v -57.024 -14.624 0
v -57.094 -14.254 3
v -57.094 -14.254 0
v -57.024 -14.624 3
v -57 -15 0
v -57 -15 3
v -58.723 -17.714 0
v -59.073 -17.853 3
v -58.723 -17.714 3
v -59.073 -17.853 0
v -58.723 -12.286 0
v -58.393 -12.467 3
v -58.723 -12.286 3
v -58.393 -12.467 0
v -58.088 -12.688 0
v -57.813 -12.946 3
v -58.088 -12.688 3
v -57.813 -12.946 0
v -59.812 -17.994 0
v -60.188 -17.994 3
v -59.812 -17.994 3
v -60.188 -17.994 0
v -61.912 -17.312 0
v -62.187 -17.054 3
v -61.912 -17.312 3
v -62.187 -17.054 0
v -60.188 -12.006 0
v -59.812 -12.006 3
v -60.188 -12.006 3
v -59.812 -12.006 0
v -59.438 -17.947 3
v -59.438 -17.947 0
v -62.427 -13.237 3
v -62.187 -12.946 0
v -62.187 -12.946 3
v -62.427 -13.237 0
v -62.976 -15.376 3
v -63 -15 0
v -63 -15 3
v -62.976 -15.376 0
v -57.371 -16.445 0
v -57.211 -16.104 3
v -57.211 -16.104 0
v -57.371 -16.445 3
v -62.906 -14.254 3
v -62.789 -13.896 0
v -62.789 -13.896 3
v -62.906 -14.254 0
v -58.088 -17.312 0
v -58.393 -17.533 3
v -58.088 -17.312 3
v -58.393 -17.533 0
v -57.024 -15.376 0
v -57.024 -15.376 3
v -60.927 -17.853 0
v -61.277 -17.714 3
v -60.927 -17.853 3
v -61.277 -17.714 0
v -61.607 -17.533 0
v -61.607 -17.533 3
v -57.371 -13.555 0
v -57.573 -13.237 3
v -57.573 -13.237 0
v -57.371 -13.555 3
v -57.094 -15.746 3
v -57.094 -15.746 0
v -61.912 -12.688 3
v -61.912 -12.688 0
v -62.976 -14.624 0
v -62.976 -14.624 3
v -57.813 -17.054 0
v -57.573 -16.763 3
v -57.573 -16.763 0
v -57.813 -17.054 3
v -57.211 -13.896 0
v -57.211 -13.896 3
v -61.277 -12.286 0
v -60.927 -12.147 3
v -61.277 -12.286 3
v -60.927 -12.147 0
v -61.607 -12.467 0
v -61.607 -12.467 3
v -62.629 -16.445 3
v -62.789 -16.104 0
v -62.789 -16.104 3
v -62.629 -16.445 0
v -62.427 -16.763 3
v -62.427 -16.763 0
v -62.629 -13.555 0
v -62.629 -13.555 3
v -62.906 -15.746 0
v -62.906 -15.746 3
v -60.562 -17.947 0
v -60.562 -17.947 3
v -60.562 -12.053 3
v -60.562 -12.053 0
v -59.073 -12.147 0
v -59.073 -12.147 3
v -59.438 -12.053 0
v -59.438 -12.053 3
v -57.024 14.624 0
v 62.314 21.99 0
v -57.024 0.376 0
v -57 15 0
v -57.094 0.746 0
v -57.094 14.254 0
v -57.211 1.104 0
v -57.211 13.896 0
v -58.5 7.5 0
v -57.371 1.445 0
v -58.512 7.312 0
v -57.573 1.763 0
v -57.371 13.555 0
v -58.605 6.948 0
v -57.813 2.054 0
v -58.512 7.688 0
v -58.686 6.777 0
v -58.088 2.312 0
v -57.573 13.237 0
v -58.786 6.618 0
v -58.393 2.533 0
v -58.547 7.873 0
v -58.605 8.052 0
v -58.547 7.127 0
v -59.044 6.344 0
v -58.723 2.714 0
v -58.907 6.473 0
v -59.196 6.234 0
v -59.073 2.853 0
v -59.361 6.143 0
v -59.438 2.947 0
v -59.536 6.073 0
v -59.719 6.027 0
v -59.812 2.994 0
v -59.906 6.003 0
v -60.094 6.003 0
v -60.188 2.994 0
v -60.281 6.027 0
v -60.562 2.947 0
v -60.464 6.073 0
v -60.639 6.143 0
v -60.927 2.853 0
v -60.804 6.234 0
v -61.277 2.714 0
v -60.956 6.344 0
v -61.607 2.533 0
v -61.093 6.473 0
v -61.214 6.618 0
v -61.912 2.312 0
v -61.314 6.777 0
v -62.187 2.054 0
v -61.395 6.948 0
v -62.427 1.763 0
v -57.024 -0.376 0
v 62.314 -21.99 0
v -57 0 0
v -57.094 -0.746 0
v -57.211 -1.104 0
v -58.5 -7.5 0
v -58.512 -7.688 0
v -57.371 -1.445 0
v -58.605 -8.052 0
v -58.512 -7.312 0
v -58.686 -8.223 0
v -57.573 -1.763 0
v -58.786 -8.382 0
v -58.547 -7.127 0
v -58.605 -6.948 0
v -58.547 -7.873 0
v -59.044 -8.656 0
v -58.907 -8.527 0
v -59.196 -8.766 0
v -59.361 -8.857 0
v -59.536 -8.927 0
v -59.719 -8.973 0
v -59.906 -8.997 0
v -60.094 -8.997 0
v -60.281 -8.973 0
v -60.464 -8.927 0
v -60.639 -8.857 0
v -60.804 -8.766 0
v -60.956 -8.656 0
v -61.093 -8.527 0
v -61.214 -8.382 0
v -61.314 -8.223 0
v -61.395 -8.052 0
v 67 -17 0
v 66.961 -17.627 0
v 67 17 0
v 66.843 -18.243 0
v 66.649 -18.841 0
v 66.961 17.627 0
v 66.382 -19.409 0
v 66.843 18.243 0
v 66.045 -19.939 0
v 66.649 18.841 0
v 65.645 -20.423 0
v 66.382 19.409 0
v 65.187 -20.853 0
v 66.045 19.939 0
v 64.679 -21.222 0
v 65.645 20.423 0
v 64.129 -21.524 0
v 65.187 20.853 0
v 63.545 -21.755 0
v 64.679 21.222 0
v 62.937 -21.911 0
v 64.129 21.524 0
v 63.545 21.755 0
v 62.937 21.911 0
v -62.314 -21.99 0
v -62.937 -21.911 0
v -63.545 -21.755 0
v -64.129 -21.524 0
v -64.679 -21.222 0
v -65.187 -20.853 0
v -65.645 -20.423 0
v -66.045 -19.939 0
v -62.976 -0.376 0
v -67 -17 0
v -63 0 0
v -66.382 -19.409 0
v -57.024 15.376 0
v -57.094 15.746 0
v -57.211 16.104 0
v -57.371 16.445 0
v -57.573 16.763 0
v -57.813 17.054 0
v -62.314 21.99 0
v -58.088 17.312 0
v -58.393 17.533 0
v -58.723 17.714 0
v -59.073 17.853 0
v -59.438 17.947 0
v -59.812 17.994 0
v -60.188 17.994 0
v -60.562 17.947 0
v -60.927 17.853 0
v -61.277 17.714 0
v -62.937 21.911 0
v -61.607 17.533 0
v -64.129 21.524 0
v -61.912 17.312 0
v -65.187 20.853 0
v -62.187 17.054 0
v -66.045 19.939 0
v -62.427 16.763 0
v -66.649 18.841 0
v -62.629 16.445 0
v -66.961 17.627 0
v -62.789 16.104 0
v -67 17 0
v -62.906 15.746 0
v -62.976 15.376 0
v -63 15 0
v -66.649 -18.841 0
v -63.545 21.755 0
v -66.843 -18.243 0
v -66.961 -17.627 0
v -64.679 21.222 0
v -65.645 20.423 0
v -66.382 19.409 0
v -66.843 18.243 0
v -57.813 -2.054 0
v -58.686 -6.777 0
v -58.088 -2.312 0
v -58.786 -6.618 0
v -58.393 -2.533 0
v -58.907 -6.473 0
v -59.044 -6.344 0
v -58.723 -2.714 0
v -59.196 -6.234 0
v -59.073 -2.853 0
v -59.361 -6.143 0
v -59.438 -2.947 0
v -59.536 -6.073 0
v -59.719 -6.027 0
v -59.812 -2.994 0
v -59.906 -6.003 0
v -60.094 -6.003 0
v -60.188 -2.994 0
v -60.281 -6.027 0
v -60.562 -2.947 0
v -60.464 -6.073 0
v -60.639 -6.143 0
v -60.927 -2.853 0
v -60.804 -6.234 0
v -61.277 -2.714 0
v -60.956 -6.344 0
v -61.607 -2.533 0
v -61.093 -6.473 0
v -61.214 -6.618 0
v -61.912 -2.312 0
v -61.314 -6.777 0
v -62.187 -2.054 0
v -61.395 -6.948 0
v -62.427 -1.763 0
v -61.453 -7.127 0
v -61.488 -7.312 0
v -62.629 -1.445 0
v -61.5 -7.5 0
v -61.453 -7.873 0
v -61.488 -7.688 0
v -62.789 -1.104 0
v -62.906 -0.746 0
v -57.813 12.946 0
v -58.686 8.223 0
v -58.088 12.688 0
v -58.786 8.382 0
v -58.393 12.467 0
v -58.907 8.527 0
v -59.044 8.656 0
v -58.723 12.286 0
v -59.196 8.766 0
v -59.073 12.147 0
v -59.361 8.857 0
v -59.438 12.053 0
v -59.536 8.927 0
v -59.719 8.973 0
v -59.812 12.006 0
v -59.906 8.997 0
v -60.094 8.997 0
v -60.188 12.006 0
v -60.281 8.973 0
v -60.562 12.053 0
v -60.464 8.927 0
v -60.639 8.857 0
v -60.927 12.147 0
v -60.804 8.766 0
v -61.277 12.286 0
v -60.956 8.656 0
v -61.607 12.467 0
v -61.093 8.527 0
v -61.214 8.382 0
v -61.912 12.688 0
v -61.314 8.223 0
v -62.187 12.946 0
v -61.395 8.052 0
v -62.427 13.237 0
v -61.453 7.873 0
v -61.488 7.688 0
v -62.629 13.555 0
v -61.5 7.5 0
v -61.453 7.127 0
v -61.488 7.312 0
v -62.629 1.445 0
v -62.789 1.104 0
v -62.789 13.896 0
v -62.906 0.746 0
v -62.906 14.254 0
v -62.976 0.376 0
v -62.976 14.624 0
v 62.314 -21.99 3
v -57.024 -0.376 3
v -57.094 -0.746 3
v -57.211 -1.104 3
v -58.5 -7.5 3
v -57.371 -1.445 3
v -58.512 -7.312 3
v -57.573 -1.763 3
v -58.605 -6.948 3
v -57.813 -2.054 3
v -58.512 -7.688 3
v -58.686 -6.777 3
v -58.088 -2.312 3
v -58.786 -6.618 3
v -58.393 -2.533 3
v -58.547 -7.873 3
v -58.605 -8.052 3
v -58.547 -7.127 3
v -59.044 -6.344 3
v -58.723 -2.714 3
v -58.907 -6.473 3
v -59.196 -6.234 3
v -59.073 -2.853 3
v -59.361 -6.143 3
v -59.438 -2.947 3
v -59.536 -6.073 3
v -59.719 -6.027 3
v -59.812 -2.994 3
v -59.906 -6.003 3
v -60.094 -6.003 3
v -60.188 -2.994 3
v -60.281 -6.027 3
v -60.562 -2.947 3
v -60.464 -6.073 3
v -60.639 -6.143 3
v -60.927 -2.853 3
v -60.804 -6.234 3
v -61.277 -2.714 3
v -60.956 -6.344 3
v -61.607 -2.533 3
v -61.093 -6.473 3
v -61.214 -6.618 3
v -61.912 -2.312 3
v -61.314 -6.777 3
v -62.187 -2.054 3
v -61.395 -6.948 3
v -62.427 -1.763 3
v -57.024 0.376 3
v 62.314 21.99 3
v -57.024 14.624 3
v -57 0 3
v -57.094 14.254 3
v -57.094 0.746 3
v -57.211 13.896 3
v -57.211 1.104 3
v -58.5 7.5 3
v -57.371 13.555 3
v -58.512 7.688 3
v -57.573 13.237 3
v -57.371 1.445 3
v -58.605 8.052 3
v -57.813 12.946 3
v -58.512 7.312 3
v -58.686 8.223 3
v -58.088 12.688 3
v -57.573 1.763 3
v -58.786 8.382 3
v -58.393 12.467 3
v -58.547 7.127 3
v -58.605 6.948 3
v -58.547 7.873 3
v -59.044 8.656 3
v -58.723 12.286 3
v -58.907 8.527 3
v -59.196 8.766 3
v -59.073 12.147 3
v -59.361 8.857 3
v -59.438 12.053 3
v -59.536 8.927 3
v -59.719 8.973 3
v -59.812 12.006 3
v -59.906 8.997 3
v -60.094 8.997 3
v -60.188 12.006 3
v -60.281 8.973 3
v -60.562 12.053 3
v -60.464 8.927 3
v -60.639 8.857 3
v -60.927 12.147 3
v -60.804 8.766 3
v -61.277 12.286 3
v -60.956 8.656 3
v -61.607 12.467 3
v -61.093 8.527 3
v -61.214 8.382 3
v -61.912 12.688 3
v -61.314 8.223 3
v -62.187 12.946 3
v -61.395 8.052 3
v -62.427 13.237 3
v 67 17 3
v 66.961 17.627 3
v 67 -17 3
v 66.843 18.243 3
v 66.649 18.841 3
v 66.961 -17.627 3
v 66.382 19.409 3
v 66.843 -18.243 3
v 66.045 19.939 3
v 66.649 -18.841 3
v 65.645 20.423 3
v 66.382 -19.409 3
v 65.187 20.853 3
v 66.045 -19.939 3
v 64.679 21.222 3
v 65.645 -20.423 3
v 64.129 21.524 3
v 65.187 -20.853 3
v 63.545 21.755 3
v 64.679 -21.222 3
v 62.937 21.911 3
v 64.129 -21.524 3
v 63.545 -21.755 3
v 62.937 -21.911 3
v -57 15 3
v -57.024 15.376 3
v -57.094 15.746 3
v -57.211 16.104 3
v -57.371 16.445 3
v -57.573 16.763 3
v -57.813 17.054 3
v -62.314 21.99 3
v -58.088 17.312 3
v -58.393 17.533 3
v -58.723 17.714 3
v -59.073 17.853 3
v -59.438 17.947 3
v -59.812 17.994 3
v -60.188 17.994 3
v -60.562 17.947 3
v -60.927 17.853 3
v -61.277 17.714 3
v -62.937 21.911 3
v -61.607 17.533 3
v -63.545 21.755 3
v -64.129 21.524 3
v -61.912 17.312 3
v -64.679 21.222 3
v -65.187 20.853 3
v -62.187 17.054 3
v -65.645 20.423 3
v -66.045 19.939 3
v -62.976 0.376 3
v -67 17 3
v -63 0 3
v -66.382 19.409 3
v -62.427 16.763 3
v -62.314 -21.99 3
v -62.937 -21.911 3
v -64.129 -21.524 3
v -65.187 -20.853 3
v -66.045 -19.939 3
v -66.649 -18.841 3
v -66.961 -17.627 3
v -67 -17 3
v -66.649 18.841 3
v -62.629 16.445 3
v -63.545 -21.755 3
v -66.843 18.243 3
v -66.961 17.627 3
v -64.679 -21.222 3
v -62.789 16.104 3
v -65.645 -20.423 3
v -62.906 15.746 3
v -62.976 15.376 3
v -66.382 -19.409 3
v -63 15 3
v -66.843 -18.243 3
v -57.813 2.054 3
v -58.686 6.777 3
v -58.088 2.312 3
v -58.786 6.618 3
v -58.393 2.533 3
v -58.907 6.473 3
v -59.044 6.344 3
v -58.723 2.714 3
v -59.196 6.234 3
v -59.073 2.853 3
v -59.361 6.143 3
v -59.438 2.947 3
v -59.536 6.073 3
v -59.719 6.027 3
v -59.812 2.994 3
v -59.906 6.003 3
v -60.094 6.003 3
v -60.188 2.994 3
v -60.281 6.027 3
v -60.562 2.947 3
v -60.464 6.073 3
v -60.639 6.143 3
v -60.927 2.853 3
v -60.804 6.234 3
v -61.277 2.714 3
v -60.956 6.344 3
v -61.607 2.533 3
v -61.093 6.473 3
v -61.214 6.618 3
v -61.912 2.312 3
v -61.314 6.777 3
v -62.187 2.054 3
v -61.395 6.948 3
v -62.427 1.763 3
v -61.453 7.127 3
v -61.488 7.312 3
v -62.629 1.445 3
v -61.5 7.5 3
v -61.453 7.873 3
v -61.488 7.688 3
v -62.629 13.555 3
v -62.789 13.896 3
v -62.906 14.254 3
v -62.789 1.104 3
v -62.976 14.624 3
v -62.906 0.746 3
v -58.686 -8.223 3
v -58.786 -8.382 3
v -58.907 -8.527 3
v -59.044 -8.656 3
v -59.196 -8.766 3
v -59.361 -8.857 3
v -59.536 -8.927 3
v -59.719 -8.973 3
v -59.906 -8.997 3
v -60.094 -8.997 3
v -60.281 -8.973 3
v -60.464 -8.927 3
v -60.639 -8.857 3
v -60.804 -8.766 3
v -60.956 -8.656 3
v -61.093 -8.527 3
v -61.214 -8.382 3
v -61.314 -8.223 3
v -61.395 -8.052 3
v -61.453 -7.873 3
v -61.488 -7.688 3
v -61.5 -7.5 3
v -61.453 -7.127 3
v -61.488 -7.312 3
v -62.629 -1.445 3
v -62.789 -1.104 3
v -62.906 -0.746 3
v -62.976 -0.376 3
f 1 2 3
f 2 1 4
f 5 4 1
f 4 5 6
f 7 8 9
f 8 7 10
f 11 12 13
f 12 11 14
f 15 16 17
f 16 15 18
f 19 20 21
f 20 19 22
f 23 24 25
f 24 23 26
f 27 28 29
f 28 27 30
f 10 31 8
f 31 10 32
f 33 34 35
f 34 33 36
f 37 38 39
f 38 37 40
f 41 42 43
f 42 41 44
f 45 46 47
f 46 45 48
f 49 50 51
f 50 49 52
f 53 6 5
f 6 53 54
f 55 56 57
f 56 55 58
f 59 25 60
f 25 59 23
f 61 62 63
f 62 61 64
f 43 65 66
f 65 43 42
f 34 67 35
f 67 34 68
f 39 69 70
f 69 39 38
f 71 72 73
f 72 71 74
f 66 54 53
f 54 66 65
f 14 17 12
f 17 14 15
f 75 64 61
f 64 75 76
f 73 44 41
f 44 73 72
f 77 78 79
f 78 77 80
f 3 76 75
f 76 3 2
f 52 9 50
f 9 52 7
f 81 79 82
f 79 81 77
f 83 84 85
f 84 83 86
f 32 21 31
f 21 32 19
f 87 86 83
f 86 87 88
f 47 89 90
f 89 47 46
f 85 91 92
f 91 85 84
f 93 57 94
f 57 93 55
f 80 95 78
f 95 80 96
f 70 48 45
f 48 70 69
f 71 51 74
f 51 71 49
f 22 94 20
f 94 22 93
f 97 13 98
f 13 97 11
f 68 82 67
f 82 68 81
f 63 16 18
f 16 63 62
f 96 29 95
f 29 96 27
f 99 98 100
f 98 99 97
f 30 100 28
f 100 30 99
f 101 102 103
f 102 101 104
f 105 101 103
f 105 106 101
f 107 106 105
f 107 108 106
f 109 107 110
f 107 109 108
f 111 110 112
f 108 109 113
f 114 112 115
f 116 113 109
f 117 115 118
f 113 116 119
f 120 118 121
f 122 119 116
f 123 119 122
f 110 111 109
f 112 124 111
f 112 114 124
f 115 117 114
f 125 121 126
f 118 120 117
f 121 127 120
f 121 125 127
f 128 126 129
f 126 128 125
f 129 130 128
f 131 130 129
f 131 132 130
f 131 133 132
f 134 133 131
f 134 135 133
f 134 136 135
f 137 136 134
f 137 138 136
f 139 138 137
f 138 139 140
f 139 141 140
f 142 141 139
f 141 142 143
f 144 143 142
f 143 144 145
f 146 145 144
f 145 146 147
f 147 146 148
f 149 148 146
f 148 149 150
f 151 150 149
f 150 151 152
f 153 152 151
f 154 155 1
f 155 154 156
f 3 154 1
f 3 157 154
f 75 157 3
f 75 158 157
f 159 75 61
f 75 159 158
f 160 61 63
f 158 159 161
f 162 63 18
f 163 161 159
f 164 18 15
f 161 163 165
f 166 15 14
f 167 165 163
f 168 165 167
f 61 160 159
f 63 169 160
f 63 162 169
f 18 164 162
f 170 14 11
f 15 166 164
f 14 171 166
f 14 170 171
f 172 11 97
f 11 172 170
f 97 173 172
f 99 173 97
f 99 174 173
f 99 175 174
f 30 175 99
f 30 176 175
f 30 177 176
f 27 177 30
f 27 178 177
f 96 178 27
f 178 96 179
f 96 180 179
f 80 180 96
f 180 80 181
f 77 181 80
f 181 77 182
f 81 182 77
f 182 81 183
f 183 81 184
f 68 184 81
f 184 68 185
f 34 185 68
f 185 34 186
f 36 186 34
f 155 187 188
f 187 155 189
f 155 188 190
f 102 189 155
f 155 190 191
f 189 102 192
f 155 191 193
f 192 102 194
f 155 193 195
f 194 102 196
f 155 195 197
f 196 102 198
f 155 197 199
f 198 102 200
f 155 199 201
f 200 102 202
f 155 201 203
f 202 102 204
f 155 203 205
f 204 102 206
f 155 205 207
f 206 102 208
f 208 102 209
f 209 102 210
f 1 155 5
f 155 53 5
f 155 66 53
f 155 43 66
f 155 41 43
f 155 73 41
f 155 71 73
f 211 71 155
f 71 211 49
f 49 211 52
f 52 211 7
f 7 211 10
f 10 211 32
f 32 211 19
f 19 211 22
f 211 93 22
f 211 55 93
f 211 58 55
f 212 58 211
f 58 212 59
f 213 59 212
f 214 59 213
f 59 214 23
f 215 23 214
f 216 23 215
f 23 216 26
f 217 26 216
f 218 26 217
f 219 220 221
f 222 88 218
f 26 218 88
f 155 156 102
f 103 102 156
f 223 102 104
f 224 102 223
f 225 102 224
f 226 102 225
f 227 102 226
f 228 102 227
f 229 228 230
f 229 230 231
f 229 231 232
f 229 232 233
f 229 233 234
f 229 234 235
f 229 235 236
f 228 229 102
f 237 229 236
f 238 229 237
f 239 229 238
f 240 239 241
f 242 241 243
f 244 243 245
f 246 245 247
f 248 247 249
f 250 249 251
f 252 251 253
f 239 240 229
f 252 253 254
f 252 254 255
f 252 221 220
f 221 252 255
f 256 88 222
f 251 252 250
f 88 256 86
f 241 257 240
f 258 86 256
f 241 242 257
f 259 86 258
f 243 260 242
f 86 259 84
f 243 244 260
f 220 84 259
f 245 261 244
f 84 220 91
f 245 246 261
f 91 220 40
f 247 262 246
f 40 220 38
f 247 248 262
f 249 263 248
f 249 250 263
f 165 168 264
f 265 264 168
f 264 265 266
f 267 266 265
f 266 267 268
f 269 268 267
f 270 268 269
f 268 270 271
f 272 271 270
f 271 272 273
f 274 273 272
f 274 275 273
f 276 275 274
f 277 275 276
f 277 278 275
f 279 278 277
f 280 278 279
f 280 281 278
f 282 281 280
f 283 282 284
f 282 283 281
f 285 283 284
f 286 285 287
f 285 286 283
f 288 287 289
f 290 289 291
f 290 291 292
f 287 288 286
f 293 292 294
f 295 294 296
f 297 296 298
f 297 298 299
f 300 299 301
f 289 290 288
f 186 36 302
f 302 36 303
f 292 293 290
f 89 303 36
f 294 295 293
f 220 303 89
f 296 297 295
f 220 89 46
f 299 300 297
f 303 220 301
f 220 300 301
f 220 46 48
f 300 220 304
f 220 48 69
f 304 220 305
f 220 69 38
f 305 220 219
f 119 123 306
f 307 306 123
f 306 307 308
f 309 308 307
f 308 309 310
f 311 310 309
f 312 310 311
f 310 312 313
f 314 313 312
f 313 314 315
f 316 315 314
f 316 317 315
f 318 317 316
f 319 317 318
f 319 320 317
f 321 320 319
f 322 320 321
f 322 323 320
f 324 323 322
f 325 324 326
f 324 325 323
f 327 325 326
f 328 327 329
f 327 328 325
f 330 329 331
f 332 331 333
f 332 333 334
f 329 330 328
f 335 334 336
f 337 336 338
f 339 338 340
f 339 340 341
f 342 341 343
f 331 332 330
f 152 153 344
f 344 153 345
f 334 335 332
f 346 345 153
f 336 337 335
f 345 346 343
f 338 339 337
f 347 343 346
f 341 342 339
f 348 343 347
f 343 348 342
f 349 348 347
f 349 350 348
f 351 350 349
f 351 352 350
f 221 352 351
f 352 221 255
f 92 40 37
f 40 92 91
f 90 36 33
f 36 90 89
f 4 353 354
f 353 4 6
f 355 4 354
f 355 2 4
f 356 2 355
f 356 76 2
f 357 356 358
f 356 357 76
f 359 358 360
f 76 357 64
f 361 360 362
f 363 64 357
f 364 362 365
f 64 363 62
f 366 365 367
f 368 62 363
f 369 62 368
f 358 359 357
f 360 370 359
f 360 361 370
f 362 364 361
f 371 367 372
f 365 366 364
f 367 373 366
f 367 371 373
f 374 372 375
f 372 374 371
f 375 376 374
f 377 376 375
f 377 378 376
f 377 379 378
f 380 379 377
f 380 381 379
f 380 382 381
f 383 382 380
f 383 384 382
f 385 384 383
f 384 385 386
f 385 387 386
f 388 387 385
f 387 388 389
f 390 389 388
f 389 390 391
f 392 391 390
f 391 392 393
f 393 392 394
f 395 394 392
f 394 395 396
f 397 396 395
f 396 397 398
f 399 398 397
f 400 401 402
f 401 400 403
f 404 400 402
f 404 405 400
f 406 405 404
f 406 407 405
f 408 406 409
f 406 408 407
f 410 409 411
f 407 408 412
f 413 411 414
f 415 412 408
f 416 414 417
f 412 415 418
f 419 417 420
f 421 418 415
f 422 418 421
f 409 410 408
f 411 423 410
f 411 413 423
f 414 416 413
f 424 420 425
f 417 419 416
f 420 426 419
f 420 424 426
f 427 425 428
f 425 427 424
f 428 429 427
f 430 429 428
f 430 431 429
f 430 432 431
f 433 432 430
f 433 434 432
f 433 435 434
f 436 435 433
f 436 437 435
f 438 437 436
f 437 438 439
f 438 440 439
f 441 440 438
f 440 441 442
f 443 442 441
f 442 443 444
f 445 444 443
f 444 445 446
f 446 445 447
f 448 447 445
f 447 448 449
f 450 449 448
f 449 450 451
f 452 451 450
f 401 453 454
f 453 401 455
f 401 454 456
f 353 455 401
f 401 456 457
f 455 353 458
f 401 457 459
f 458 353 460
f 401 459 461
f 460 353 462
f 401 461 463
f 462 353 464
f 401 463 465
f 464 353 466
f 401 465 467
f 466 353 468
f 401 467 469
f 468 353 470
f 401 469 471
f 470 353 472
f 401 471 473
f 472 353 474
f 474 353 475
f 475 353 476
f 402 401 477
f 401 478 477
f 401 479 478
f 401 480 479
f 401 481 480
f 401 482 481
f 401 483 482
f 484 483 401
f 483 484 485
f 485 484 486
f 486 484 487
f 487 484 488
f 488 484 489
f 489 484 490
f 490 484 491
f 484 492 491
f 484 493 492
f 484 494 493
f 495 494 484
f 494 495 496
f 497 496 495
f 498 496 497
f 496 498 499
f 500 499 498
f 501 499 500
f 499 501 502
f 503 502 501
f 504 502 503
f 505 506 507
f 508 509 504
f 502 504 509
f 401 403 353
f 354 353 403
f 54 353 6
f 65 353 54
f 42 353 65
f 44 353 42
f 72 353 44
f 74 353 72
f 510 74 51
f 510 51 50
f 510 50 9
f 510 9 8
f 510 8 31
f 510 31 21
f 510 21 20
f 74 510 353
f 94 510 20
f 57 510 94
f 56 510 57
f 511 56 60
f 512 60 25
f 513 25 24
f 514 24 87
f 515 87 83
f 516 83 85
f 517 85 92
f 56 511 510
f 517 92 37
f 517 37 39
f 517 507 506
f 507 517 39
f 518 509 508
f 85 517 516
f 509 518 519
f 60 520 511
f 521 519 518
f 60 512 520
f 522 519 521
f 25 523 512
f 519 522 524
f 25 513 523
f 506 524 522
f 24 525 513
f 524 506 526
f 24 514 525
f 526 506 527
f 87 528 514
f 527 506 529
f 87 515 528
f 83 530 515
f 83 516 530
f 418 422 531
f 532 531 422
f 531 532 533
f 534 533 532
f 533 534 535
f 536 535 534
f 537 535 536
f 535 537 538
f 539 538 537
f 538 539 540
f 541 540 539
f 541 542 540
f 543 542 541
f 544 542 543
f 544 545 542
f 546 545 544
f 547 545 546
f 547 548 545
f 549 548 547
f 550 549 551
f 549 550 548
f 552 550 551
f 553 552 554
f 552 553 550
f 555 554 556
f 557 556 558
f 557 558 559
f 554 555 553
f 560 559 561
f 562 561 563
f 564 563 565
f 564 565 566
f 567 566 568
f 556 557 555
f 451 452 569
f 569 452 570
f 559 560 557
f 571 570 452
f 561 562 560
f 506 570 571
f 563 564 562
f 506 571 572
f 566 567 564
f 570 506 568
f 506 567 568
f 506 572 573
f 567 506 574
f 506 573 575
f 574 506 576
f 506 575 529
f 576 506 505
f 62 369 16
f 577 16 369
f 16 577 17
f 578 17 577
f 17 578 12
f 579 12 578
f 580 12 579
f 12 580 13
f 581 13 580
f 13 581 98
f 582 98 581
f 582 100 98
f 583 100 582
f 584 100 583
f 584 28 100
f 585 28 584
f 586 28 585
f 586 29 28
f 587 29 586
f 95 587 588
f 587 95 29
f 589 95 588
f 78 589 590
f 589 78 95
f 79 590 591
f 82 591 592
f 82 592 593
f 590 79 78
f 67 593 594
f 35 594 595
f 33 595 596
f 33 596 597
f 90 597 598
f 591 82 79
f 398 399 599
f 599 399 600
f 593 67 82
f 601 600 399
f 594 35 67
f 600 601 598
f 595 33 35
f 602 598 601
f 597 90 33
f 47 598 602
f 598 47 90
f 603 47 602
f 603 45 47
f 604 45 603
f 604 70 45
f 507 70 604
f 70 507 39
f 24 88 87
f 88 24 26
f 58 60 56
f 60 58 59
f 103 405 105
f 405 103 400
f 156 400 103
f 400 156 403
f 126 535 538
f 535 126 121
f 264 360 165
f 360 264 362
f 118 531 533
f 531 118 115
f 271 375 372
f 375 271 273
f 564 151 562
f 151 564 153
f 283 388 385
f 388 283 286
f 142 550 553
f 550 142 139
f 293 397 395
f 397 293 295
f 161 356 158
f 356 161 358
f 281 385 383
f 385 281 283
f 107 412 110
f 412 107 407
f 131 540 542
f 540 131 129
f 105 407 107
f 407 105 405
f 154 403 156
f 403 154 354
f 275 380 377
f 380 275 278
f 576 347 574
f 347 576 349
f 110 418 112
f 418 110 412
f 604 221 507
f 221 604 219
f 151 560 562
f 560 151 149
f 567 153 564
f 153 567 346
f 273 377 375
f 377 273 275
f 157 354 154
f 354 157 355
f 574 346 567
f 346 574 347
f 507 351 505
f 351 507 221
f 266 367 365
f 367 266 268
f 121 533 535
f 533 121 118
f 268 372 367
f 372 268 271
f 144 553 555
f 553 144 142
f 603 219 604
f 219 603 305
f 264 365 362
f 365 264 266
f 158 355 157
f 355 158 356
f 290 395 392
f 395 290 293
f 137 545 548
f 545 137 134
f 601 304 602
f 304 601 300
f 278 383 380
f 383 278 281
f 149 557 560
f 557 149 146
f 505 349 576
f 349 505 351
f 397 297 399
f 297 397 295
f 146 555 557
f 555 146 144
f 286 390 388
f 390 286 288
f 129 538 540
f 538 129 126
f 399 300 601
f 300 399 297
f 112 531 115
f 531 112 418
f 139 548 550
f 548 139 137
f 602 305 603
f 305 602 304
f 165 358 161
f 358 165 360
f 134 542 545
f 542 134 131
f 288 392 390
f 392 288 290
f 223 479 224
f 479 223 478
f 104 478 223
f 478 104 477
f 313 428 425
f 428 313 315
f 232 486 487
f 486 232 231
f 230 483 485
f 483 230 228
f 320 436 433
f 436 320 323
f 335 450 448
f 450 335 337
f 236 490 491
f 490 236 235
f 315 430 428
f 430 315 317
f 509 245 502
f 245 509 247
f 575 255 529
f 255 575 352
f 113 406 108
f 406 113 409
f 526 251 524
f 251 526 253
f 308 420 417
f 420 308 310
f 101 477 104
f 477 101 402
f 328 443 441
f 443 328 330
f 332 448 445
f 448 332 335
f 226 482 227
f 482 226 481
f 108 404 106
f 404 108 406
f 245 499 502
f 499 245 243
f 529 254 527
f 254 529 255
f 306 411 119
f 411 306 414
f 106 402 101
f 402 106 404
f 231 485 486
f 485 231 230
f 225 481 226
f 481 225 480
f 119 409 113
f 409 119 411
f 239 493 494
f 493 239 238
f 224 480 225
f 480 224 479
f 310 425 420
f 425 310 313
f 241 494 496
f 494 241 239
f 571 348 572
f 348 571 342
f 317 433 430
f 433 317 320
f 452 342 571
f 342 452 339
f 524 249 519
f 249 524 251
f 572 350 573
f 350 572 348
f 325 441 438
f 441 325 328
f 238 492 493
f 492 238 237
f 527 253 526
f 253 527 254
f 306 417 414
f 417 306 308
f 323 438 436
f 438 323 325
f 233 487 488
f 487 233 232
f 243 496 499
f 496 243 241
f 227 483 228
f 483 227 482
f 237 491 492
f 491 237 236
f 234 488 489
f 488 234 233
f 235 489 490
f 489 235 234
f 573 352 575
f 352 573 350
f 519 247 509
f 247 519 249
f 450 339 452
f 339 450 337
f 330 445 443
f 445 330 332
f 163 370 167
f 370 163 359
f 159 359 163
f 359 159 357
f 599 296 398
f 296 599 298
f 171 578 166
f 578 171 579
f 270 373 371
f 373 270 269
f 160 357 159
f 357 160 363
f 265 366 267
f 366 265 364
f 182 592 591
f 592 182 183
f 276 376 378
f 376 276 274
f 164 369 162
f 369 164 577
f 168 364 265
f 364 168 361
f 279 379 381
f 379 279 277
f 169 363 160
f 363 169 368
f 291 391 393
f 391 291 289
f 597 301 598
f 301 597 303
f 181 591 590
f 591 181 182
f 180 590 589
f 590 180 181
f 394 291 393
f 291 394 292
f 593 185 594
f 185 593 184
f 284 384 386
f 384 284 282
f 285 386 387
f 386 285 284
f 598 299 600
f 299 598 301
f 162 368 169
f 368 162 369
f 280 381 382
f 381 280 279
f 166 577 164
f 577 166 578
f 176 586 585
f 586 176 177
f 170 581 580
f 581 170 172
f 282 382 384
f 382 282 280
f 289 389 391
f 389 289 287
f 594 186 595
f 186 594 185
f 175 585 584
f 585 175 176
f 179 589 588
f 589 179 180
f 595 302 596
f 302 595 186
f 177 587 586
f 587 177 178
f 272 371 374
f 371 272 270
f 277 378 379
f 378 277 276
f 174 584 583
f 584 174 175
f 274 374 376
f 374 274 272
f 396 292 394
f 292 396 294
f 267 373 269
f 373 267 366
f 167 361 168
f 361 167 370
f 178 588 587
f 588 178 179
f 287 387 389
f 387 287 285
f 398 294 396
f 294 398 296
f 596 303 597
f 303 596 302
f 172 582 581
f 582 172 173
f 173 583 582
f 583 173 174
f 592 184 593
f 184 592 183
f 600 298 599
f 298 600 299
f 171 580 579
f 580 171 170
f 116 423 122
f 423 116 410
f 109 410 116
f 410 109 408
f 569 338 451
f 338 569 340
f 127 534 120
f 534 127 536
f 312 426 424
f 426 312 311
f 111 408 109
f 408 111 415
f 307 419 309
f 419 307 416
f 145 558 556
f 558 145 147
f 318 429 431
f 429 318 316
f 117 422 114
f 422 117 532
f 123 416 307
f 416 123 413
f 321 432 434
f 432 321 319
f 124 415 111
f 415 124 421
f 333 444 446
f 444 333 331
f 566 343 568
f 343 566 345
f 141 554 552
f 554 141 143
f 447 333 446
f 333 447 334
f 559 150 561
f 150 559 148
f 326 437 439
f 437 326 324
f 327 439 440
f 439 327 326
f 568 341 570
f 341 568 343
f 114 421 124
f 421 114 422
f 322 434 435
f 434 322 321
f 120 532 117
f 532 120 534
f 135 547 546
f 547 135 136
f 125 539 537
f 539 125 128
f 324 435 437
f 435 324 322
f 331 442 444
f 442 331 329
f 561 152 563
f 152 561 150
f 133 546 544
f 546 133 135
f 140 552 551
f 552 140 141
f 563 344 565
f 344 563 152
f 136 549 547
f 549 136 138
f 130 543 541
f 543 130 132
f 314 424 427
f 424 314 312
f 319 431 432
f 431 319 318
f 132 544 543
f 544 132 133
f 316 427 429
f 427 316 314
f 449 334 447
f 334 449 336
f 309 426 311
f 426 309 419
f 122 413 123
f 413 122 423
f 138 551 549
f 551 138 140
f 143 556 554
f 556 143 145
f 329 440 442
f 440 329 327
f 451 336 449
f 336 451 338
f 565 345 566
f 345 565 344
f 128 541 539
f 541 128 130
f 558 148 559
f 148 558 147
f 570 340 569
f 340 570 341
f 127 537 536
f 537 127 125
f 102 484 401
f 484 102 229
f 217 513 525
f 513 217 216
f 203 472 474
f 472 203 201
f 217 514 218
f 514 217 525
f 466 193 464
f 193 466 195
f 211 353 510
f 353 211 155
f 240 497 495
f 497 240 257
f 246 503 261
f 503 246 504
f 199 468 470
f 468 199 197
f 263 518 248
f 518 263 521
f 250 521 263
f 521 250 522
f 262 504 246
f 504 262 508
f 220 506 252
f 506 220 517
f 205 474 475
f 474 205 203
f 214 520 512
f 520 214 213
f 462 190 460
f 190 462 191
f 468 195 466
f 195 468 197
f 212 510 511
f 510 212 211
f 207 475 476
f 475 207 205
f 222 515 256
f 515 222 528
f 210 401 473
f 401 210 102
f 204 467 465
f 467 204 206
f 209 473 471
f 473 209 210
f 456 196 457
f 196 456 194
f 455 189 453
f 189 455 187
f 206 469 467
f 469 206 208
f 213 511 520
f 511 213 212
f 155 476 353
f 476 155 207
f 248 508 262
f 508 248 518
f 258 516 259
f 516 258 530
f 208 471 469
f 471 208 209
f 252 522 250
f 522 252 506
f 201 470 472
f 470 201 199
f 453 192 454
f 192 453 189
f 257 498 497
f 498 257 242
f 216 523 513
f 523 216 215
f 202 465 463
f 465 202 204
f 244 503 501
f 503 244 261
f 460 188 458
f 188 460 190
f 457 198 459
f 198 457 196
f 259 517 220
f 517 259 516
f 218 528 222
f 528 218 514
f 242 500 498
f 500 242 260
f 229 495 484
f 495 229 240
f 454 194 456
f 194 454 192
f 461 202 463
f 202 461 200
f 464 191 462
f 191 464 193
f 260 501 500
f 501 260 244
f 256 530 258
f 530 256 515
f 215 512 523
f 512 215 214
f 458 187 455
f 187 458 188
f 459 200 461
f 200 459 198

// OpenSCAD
$fn = 50;


difference() {
	union() {
		hull() {
			translate(v = [-62.0000000000, 17.0000000000, 0]) {
				cylinder(h = 3, r = 5);
			}
			translate(v = [62.0000000000, 17.0000000000, 0]) {
				cylinder(h = 3, r = 5);
			}
			translate(v = [-62.0000000000, -17.0000000000, 0]) {
				cylinder(h = 3, r = 5);
			}
			translate(v = [62.0000000000, -17.0000000000, 0]) {
				cylinder(h = 3, r = 5);
			}
		}
	}
	union() {
		translate(v = [-60.0000000000, -15.0000000000, 0]) {
			cylinder(h = 3, r = 3.0000000000);
		}
		translate(v = [-60.0000000000, 0.0000000000, 0]) {
			cylinder(h = 3, r = 3.0000000000);
		}
		translate(v = [-60.0000000000, 15.0000000000, 0]) {
			cylinder(h = 3, r = 3.0000000000);
		}
		translate(v = [-60.0000000000, -15.0000000000, 0]) {
			cylinder(h = 3, r = 1.5000000000);
		}
		translate(v = [-60.0000000000, -7.5000000000, 0]) {
			cylinder(h = 3, r = 1.5000000000);
		}
		translate(v = [-60.0000000000, 0.0000000000, 0]) {
			cylinder(h = 3, r = 1.5000000000);
		}
		translate(v = [-60.0000000000, 7.5000000000, 0]) {
			cylinder(h = 3, r = 1.5000000000);
		}
		translate(v = [-60.0000000000, 15.0000000000, 0]) {
			cylinder(h = 3, r = 1.5000000000);
		}
		translate(v = [-60.0000000000, -15.0000000000, 0]) {
			cylinder(h = 3, r = 1.5000000000);
		}
		translate(v = [-60.0000000000, -7.5000000000, 0]) {
			cylinder(h = 3, r = 1.5000000000);
		}
		translate(v = [-60.0000000000, 0.0000000000, 0]) {
			cylinder(h = 3, r = 1.5000000000);
		}
		translate(v = [-60.0000000000, 7.5000000000, 0]) {
			cylinder(h = 3, r = 1.5000000000);
		}
		translate(v = [-60.0000000000, 15.0000000000, 0]) {
			cylinder(h = 3, r = 1.5000000000);
		}
		translate(v = [-60.0000000000, -15.0000000000, 0]) {
			cylinder(h = 3, r = 1.5000000000);
		}
		translate(v = [-60.0000000000, -7.5000000000, 0]) {
			cylinder(h = 3, r = 1.5000000000);
		}
		translate(v = [-60.0000000000, 0.0000000000, 0]) {
			cylinder(h = 3, r = 1.5000000000);
		}
		translate(v = [-60.0000000000, 7.5000000000, 0]) {
			cylinder(h = 3, r = 1.5000000000);
		}
		translate(v = [-60.0000000000, 15.0000000000, 0]) {
			cylinder(h = 3, r = 1.5000000000);
		}
	}
}
